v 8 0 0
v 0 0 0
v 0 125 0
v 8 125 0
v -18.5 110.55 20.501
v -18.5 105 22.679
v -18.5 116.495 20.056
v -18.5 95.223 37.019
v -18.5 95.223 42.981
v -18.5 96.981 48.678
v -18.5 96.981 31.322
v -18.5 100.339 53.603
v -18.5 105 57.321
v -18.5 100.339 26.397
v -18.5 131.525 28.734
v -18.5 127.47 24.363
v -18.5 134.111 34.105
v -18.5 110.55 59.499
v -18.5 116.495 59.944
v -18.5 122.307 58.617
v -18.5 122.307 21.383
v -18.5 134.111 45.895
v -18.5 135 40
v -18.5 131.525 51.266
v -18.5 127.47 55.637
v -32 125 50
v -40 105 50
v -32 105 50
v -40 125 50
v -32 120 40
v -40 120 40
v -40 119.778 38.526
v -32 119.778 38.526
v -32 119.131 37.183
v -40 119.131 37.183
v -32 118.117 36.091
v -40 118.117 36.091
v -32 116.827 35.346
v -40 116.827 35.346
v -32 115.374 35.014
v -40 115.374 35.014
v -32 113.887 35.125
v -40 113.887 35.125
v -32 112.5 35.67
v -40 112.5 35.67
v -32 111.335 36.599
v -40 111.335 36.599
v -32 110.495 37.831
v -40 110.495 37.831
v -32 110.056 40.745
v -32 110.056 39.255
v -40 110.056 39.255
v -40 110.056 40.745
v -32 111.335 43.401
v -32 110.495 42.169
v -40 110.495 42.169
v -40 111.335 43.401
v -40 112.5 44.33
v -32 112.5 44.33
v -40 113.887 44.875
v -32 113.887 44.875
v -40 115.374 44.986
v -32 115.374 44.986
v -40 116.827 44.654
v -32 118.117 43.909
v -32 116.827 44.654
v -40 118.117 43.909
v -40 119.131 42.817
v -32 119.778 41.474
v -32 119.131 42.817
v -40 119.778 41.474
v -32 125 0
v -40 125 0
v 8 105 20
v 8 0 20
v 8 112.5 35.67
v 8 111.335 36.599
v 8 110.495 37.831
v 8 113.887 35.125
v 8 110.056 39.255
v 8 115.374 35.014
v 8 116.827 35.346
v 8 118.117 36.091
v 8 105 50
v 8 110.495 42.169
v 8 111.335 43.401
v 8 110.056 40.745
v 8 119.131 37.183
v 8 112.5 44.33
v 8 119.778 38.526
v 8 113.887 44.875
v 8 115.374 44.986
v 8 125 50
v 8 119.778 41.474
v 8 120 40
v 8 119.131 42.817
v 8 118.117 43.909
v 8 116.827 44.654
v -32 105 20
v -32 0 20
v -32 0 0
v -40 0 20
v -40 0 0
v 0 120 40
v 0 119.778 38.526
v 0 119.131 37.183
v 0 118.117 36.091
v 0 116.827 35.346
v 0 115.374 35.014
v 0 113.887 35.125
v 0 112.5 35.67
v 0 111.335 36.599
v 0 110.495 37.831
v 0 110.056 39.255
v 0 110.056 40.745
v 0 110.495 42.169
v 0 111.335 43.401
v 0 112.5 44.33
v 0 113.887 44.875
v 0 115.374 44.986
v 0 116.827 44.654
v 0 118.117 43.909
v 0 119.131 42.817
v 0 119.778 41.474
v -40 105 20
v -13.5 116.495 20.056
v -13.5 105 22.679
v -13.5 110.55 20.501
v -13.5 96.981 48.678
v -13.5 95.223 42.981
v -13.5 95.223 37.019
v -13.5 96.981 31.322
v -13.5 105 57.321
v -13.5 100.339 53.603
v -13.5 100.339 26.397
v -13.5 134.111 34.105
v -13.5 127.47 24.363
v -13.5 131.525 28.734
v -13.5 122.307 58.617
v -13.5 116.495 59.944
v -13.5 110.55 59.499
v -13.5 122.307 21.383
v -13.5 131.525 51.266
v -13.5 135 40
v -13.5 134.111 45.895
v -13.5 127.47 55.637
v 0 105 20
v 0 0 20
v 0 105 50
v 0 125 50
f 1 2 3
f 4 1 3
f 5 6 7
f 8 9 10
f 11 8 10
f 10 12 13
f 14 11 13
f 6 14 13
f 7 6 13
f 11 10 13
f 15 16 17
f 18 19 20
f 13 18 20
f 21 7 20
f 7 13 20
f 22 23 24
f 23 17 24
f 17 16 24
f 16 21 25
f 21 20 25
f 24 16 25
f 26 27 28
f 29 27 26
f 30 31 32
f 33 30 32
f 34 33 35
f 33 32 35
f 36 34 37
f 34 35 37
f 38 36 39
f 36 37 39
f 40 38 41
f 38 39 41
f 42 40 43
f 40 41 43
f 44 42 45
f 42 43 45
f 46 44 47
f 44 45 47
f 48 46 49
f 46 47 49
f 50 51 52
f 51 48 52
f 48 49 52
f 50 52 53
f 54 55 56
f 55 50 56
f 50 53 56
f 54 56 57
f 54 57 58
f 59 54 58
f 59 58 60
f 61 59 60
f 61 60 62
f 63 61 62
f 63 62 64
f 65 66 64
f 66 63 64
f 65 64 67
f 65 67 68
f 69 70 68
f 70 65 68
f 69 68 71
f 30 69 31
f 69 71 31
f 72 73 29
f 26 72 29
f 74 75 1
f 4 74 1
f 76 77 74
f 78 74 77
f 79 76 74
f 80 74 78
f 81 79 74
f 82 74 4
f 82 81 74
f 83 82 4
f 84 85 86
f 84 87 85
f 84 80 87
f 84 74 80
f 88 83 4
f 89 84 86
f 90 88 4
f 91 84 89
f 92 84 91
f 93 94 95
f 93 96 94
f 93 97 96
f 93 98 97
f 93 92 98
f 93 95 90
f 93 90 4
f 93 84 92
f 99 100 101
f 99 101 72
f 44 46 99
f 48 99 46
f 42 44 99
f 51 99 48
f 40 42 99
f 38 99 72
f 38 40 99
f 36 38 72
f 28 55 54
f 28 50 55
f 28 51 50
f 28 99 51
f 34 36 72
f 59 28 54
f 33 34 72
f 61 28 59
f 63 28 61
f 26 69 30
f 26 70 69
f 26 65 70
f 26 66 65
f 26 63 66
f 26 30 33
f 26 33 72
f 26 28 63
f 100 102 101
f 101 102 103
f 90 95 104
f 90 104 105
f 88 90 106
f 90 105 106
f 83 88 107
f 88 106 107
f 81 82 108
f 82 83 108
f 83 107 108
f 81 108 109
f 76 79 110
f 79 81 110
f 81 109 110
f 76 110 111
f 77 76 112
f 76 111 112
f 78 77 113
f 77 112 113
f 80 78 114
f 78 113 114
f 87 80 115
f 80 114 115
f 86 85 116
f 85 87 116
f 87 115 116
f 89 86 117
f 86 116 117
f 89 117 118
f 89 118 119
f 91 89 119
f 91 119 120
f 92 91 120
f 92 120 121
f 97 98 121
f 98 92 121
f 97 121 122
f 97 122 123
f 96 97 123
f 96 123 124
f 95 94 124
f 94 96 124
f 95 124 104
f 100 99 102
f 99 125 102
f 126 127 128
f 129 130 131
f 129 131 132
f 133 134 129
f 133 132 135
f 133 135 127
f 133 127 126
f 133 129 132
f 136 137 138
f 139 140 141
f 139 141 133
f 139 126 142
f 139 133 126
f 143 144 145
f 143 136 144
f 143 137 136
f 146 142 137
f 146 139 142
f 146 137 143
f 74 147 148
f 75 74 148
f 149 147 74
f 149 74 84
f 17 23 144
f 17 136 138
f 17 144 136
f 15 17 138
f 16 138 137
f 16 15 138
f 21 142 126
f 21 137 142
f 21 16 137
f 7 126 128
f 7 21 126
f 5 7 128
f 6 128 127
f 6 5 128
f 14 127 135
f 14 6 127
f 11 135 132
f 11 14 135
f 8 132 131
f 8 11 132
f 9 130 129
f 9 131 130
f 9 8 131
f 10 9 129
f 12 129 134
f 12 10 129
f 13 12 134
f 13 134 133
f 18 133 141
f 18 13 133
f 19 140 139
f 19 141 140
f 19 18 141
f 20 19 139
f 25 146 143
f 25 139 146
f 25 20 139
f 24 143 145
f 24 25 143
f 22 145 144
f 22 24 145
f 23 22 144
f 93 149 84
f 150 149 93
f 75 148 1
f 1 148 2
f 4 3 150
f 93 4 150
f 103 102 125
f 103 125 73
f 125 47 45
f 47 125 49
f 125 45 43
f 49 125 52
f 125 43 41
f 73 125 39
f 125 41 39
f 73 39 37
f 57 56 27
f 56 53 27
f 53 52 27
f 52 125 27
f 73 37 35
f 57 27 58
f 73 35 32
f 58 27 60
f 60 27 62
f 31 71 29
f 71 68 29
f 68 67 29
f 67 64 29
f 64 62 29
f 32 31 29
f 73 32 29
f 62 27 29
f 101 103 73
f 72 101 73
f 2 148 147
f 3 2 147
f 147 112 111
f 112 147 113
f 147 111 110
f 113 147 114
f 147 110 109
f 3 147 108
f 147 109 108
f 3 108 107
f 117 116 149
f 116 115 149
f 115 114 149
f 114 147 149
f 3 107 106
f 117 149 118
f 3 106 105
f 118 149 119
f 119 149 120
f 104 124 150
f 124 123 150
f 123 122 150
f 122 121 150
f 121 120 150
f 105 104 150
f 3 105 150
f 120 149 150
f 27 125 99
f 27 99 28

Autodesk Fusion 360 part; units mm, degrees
sketch "Sketch1" plane through (0, 0, 0) normal (1, 0, 0) x (0, 1, 0) in component "L-bar"
  line L0 (0, 0) -> (125, 0)
  line L1 (125, 0) -> (125, 20)
  line L2 (125, 20) -> (0, 20)
  line L3 (0, 20) -> (0, 0)
  line L4 (125, 20) -> (105, 20)
  line L5 (105, 20) -> (105, 50)
  line L6 (105, 50) -> (125, 50)
  line L7 (125, 50) -> (125, 20)
  circle A0 centre (115, 40) radius 5
extrude "Extrude1" add sketch "Sketch1" along normal blind 8 makes body 1 in component "L-bar"
sketch "Sketch1 (2)" plane through (8, 0, 0) normal (1, 0, 0) x (0, 1, 0) in component "disk"
  circle A0 centre (115, 40) radius 5
  line L0 (105, 20) -> (0, 20)
  line L1 (0, 20) -> (0, 0)
  line L2 (0, 0) -> (125, 0)
  line L3 (125, 0) -> (125, 50)
  line L4 (125, 50) -> (105, 50)
  line L5 (105, 50) -> (105, 20)
  circle A1 centre (25, 75) radius 20
extrude "Extrude1'" add sketch "Sketch1 (2)" along normal blind 5 separate body contours A1 makes body 2 in component "disk"
component "L-bar" placed x (1, 0, 0) y (0, 1, 0) z (0, 0, 1) at (0, 0, 0)
component "L-bar" placed x (1, 0, 0) y (0, 1, 0) z (0, 0, 1) at (-40, 0, 0)
component "disk" placed x (1, 0, 0) y (0, 1, 0) z (0, 0, 1) at (-26.5, 90, -35)
